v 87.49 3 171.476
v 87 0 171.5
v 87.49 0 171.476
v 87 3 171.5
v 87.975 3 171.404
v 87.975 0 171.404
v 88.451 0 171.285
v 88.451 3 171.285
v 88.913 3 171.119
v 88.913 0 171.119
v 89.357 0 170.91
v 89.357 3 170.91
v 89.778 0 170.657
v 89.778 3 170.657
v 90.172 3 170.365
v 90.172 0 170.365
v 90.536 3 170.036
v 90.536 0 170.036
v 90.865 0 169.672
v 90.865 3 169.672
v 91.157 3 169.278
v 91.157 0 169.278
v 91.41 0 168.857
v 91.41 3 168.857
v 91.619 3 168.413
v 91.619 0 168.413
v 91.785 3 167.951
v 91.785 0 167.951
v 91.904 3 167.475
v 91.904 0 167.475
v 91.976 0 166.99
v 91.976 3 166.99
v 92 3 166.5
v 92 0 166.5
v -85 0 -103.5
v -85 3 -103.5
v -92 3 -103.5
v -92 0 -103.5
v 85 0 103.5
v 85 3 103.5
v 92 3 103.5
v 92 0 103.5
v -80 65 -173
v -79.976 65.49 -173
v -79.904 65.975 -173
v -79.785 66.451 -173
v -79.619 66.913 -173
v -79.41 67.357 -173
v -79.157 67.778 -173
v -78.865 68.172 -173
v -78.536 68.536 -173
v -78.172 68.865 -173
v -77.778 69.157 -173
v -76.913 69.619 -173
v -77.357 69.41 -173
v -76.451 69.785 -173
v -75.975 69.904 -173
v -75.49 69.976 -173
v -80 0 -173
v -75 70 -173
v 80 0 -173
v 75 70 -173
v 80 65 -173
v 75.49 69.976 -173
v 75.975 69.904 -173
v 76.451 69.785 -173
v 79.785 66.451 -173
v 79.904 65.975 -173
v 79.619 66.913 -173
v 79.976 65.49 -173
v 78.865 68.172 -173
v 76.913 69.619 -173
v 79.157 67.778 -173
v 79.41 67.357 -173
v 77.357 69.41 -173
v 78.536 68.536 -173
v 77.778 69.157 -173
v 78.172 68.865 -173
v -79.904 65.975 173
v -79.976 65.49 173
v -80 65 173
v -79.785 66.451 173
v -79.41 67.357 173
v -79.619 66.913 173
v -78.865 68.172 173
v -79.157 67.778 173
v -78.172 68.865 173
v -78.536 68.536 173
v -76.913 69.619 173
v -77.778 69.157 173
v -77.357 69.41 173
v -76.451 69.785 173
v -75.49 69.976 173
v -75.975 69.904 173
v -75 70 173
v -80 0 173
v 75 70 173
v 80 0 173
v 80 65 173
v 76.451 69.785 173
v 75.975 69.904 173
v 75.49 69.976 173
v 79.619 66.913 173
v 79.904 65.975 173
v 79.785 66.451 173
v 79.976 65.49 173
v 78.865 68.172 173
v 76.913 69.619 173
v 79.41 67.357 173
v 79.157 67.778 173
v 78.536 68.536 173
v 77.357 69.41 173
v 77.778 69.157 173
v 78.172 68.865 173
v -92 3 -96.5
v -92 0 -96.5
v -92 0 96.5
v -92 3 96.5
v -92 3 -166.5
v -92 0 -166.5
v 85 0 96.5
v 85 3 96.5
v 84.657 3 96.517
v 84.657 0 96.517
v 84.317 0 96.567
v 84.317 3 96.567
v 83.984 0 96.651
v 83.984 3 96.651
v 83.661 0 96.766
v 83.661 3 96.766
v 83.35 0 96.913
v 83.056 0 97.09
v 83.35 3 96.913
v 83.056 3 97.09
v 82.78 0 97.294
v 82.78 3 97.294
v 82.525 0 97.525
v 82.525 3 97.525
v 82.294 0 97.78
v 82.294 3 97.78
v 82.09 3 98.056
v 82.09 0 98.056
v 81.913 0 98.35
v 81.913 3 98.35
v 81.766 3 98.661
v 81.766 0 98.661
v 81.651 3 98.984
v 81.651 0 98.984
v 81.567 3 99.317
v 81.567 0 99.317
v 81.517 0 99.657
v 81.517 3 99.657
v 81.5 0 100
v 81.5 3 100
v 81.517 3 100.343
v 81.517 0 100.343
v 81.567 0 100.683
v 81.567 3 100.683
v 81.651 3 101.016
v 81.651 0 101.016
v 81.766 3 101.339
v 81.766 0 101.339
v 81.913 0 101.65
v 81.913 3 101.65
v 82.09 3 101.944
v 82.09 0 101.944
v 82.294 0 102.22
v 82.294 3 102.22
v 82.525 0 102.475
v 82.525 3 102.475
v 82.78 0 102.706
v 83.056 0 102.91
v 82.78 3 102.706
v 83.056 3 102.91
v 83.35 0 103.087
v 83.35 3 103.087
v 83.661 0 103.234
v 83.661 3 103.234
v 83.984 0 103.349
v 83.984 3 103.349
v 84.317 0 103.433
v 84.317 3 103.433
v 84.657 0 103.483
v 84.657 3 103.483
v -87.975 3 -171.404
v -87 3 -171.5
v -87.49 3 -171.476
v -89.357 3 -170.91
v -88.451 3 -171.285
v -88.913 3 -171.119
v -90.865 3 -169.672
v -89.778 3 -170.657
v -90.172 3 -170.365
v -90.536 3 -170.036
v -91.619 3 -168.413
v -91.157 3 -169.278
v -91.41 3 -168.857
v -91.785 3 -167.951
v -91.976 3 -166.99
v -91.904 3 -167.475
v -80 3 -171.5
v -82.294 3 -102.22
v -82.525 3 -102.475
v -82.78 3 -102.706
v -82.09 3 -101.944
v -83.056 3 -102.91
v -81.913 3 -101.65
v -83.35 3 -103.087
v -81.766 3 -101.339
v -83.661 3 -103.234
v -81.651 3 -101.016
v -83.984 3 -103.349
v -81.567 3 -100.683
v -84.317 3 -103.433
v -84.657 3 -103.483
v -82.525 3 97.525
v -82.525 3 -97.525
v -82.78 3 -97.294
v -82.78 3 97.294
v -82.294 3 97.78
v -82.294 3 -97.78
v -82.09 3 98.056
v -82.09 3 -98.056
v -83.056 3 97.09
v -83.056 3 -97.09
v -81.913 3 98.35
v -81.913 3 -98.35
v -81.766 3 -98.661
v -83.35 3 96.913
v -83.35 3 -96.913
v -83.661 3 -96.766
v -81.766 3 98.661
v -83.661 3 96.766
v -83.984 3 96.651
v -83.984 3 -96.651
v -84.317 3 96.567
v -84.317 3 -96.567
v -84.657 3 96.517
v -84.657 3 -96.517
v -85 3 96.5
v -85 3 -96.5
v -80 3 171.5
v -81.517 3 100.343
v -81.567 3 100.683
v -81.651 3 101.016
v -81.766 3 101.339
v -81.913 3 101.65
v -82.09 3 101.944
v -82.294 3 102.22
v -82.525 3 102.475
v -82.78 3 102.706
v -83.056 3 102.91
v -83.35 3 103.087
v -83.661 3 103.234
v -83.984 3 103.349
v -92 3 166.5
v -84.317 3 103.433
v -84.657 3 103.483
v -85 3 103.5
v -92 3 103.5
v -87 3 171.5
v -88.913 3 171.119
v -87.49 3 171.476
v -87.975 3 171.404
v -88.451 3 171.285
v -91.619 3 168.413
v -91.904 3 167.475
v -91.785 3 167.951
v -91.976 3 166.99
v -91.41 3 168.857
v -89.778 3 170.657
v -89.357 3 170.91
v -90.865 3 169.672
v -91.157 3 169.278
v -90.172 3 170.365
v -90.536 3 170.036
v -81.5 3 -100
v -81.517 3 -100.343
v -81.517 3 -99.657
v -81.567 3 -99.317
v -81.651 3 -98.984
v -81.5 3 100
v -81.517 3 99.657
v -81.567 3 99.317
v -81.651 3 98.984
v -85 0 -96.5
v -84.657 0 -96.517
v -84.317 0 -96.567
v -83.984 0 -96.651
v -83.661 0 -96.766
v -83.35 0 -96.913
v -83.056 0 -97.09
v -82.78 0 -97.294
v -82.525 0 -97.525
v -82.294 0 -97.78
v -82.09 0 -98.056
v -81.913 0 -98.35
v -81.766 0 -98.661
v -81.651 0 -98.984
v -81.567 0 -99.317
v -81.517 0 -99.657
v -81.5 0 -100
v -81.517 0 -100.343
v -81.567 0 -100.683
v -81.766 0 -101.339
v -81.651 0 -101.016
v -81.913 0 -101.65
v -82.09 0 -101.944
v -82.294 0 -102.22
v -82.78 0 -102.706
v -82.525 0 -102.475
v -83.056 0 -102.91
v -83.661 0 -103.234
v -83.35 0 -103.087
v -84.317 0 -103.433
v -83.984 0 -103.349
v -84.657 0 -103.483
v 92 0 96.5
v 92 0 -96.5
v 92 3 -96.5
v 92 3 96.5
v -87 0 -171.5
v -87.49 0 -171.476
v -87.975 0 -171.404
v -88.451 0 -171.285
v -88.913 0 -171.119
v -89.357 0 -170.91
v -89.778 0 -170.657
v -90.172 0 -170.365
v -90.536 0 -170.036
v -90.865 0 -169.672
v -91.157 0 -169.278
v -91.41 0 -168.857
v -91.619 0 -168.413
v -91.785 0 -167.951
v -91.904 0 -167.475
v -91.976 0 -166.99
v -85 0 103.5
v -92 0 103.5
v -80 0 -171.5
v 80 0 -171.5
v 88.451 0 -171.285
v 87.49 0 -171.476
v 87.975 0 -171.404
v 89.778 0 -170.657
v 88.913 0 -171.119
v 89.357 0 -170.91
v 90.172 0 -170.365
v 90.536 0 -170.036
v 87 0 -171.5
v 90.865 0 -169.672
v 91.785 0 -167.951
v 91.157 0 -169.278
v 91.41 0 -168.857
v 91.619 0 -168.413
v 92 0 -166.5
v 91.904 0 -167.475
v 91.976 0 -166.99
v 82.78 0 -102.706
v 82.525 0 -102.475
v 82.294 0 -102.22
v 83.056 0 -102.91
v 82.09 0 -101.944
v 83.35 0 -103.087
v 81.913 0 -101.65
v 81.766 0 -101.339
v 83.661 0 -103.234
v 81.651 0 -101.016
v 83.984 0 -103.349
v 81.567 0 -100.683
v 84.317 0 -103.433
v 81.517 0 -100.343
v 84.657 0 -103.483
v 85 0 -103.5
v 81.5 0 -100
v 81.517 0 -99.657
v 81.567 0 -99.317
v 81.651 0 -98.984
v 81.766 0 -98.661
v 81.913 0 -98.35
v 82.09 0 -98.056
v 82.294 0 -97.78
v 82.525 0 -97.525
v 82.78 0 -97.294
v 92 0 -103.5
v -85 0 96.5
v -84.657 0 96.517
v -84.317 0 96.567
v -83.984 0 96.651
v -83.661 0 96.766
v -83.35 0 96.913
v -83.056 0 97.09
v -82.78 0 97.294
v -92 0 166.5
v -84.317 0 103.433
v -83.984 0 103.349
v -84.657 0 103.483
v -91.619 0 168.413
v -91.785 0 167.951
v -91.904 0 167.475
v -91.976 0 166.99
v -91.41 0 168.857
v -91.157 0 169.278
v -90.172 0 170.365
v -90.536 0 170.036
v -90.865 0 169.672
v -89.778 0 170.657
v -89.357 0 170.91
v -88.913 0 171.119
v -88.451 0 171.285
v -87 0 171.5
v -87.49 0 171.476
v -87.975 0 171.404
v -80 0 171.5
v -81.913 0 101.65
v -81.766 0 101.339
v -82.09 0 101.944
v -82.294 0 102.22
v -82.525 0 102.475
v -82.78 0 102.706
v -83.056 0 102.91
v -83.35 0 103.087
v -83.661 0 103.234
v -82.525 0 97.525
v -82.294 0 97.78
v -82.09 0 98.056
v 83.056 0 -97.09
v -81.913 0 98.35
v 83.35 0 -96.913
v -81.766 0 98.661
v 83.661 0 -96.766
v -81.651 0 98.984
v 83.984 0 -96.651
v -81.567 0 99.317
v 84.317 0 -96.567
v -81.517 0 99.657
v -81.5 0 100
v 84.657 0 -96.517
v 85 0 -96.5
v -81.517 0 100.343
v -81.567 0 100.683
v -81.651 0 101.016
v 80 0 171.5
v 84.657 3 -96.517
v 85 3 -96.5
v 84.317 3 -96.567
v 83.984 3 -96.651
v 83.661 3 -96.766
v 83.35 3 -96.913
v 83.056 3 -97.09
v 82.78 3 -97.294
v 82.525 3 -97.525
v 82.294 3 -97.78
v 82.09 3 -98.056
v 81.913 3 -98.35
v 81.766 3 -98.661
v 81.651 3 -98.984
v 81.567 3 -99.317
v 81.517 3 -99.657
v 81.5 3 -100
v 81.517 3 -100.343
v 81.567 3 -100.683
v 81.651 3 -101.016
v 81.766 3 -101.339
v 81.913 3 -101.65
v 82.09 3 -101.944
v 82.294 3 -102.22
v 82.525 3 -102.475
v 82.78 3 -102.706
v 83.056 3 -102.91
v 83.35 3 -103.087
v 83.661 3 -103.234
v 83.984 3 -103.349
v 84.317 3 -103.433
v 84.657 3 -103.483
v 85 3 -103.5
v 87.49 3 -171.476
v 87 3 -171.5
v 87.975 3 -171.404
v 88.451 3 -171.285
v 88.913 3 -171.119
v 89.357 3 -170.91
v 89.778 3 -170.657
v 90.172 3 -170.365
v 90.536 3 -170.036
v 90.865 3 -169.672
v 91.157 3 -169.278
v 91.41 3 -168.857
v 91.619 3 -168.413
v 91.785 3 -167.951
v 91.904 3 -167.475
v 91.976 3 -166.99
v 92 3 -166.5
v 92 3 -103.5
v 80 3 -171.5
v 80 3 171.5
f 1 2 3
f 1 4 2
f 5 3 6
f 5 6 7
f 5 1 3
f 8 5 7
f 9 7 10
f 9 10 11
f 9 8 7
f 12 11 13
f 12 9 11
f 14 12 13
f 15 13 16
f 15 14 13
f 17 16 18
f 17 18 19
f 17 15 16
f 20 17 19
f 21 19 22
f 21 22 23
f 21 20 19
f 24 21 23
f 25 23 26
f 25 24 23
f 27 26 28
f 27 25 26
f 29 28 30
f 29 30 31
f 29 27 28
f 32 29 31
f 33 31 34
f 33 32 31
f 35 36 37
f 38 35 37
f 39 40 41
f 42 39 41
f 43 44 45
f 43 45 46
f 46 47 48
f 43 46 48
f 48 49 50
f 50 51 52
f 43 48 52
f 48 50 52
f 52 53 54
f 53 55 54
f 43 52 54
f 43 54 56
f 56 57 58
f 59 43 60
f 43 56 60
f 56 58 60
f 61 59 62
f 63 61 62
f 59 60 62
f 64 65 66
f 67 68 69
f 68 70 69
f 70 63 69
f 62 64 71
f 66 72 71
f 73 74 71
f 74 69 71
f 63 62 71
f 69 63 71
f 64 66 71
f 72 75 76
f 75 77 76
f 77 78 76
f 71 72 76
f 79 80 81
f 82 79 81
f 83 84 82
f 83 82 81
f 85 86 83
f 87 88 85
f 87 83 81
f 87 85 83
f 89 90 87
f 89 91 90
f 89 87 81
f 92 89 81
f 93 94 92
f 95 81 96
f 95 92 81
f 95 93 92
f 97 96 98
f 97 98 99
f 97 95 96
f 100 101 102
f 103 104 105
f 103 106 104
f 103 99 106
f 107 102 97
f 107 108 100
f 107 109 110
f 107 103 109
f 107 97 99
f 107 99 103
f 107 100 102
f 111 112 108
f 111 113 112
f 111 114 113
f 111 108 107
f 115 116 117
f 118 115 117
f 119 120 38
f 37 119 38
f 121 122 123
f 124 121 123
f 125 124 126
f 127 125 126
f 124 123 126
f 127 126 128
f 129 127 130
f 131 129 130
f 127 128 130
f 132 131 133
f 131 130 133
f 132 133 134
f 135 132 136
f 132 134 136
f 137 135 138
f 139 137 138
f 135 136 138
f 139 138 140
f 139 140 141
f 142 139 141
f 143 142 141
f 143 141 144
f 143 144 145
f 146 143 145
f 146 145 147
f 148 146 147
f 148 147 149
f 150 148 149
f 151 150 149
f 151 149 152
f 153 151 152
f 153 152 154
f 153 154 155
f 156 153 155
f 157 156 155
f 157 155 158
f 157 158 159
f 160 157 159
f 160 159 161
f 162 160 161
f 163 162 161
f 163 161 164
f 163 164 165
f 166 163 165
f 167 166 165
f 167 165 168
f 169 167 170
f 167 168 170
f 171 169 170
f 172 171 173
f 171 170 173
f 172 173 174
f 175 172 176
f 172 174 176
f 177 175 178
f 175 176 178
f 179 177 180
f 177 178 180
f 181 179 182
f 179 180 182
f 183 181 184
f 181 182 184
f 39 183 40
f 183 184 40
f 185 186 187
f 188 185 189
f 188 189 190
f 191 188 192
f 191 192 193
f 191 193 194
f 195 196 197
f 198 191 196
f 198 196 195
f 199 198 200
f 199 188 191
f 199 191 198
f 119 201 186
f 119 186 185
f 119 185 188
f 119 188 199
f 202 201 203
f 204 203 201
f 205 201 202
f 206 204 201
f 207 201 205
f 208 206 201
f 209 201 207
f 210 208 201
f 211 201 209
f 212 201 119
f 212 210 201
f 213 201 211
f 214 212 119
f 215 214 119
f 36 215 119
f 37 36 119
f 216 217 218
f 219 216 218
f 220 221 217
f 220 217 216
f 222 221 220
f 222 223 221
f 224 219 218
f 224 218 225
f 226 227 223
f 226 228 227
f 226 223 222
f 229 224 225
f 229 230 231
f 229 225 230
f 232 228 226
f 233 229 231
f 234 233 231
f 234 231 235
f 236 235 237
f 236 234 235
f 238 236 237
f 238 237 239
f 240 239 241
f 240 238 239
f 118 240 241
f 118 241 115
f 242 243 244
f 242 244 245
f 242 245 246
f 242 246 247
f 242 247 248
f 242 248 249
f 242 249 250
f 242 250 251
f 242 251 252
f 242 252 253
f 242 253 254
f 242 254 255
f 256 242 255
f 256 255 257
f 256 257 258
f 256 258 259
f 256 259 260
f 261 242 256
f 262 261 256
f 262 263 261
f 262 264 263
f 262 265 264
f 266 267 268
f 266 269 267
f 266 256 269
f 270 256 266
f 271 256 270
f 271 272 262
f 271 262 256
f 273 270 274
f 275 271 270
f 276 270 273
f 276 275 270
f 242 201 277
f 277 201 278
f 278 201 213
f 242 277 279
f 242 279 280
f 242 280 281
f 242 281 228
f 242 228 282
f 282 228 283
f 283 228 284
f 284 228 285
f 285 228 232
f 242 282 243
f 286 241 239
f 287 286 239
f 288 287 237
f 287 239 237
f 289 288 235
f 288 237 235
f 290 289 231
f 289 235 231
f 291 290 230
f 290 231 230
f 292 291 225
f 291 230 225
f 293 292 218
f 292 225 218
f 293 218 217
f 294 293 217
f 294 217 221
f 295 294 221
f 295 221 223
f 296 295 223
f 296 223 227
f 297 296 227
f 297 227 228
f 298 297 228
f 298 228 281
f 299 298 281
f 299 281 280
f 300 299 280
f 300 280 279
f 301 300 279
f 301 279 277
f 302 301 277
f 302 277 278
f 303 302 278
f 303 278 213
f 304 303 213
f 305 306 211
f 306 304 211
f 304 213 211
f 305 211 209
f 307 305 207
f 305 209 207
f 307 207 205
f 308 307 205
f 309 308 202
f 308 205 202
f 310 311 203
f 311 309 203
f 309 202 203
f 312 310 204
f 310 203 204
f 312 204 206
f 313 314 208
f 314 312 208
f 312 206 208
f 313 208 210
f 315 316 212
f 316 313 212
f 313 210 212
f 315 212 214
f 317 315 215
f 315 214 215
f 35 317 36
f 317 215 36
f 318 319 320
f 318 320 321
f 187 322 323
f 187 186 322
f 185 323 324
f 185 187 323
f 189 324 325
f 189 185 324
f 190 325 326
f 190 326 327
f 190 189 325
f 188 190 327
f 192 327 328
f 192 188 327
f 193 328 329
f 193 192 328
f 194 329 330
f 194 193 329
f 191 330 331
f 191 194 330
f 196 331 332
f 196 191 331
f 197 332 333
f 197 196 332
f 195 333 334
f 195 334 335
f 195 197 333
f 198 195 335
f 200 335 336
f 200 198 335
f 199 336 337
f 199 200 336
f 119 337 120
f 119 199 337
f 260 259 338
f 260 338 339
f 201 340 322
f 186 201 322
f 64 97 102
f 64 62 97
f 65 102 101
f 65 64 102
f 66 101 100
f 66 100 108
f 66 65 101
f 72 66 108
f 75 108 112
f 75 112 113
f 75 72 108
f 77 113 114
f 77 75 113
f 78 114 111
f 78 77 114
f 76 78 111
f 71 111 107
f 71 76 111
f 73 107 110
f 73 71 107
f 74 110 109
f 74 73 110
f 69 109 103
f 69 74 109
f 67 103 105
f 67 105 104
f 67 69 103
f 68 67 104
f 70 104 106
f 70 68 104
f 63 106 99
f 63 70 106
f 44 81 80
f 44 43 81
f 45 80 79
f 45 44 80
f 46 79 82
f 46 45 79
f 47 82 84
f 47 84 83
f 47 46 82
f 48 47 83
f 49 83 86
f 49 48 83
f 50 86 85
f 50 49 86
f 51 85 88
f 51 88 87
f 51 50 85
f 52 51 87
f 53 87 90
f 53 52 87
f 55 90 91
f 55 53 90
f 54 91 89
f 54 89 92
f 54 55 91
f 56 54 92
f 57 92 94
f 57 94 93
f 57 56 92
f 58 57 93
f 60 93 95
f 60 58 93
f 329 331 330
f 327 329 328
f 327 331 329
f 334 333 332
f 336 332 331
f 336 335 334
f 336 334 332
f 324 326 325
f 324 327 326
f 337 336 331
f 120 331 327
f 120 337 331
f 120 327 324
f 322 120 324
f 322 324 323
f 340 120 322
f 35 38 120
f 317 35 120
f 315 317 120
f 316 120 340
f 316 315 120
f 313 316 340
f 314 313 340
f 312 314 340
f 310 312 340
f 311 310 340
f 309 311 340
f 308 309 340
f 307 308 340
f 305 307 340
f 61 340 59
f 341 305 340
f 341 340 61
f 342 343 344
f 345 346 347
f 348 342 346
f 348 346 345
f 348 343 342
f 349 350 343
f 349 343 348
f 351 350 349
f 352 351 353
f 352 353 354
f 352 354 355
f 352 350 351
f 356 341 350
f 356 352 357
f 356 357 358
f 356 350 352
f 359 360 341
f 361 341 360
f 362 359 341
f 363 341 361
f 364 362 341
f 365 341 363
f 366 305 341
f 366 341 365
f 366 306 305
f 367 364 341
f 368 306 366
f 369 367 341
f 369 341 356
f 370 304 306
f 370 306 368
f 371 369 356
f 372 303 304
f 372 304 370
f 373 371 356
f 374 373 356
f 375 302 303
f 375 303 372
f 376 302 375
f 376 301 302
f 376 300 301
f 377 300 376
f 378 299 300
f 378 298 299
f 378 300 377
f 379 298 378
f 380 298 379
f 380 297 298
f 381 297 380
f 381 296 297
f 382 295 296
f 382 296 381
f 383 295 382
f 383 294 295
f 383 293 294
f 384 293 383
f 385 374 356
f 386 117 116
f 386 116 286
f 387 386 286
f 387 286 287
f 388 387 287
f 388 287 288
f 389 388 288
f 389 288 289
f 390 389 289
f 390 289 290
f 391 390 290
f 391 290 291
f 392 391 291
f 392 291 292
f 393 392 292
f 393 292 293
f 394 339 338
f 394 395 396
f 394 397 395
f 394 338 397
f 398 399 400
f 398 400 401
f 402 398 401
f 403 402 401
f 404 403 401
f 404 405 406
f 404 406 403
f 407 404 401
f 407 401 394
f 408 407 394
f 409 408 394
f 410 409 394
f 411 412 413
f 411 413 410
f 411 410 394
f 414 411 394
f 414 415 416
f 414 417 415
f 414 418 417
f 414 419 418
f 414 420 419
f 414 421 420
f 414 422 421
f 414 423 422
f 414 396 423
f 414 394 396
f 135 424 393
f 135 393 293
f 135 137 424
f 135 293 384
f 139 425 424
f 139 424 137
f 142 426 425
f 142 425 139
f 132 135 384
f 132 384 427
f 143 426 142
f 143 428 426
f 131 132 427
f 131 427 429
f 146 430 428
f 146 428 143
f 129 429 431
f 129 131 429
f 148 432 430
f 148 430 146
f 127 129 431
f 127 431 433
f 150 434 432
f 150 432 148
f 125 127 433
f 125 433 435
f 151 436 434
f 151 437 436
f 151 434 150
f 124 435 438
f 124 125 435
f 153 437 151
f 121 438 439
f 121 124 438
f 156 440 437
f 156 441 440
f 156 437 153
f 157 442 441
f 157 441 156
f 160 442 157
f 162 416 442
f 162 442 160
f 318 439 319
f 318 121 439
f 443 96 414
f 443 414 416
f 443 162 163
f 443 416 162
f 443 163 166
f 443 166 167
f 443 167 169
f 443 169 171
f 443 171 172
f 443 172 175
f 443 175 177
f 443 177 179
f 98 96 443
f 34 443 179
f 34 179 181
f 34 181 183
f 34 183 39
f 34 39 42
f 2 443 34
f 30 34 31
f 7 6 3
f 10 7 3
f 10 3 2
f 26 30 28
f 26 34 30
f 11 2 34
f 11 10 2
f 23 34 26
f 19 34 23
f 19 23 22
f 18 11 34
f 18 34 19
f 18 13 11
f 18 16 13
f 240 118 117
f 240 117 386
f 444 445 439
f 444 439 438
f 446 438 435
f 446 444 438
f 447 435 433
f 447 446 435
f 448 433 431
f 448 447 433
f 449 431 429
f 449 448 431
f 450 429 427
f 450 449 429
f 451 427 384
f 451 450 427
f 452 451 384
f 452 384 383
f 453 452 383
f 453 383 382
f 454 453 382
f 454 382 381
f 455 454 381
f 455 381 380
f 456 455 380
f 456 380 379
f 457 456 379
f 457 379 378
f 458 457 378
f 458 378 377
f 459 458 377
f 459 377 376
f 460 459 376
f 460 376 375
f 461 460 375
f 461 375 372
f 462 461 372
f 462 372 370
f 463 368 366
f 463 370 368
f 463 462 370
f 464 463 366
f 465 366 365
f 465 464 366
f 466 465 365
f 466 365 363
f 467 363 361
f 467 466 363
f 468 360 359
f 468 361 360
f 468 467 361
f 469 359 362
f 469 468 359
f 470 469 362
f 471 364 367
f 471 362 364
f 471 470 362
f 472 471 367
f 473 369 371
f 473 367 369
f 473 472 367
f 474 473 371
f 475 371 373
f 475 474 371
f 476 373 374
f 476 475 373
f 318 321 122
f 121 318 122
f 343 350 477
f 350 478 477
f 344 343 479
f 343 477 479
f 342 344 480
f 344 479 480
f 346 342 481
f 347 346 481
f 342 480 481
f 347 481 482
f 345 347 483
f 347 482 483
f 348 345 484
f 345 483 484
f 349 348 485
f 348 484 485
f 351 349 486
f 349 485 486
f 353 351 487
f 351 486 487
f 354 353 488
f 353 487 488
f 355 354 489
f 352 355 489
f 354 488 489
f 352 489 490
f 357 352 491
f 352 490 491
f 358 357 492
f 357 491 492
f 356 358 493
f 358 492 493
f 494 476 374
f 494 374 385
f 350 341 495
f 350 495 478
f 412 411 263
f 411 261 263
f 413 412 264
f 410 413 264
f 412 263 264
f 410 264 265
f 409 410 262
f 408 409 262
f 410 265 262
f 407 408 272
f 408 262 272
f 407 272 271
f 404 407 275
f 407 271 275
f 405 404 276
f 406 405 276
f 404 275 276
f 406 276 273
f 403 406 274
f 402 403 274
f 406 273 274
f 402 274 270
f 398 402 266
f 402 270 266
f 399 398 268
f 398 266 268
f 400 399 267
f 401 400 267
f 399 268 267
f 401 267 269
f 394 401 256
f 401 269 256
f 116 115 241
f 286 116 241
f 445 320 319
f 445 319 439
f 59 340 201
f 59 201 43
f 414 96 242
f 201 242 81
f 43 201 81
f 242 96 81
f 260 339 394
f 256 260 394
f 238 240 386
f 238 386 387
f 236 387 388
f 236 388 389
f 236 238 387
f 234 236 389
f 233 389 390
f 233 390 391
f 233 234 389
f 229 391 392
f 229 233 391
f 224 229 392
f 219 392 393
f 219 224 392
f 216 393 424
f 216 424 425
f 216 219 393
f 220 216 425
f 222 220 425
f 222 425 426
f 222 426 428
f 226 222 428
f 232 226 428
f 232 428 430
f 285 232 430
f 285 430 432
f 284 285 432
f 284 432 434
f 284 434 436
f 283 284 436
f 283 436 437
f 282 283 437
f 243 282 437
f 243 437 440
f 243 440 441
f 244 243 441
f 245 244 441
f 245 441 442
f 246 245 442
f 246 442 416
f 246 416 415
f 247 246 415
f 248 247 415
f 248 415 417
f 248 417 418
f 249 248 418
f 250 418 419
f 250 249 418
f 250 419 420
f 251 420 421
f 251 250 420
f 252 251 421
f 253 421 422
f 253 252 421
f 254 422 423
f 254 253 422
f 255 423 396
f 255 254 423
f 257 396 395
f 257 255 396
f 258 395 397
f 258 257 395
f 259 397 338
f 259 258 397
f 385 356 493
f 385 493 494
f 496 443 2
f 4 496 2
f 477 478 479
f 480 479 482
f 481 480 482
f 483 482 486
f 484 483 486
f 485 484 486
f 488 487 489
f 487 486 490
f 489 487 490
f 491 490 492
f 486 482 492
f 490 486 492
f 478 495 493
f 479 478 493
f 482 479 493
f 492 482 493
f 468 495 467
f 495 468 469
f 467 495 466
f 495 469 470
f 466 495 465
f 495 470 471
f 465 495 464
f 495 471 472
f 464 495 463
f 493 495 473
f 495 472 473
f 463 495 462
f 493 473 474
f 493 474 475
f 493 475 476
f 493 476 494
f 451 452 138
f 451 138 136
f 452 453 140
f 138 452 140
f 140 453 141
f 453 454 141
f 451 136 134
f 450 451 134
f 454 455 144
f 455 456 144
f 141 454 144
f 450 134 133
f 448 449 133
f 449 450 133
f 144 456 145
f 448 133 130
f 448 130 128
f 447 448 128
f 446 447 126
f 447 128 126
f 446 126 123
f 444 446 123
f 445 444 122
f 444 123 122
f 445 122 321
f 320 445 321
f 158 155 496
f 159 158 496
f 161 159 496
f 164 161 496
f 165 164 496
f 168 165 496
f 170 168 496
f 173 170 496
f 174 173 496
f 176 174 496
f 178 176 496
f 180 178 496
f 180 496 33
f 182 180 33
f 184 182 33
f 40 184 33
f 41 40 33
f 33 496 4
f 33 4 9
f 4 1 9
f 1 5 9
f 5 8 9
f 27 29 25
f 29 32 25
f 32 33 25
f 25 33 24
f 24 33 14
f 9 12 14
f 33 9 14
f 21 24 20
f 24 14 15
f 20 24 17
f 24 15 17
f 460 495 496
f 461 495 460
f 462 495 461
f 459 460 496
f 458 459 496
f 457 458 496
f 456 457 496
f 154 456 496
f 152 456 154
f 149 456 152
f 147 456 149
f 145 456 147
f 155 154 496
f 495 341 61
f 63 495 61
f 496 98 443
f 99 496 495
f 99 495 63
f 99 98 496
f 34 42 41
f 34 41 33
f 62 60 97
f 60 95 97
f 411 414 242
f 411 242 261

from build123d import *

# Parameters (mm, degrees)
CROQUIS1_W              = 160
CROQUIS1_H              = 70
SALIENTE_EXTRUIR1_DEPTH = 173
CROQUIS2_W              = 12
CROQUIS2_H              = 343
SALIENTE_EXTRUIR2_DEPTH = 3
CORTAR_EXTRUIR1_DEPTH   = 4
REDONDEO1_R             = 5


with BuildPart() as part:
    # Croquis1 → Saliente-Extruir1 (new body, symmetric)
    with BuildSketch(Plane.XY):
        with Locations((0, 35)):
            Rectangle(CROQUIS1_W, CROQUIS1_H)
    extrude(amount=SALIENTE_EXTRUIR1_DEPTH, both=True)

    # Croquis2 → Saliente-Extruir2 (add)
    with BuildSketch(Plane.XZ):
        with Locations((86, 0)):
            Rectangle(CROQUIS2_W, CROQUIS2_H)
    extrude(amount=-SALIENTE_EXTRUIR2_DEPTH)

    # Croquis3 → Cortar-Extruir1 (cut, through all)
    with BuildSketch(Plane(origin=(0, 3, 0), x_dir=(1, 0, 0), z_dir=(0, 1, 0))):
        with BuildLine():
            Line((85, -103.5), (92, -103.5))
            Line((92, -103.5), (92, -96.5))
            Line((92, -96.5), (85, -96.5))
            ThreePointArc((85, -96.5), (81.5, -100), (85, -103.5))
        make_face()
    cortar_extruir1 = extrude(amount=-CORTAR_EXTRUIR1_DEPTH, mode=Mode.SUBTRACT)

    # Simetría1: Cortar-Extruir1 across plane
    add(cortar_extruir1.mirror(Plane.XY), mode=Mode.SUBTRACT)

    # Simetría5: part across plane


with BuildPart() as part_1:
    add(part.part)
    add(part.part.mirror(Plane(origin=(0, 0, 0), x_dir=(0, 0, 1), z_dir=(1, 0, 0))))

    # Redondeo1
    redondeo1_edges = [part_1.edges().sort_by_distance(p)[0] for p in [
        (92, 1.5, 171.5),
        (92, 1.5, -171.5),
        (-92, 1.5, -171.5),
        (-92, 1.5, 171.5),
        (-80, 70, 0),
        (80, 70, 0),
    ]]
    fillet(redondeo1_edges, radius=REDONDEO1_R)


solid = part_1.part
